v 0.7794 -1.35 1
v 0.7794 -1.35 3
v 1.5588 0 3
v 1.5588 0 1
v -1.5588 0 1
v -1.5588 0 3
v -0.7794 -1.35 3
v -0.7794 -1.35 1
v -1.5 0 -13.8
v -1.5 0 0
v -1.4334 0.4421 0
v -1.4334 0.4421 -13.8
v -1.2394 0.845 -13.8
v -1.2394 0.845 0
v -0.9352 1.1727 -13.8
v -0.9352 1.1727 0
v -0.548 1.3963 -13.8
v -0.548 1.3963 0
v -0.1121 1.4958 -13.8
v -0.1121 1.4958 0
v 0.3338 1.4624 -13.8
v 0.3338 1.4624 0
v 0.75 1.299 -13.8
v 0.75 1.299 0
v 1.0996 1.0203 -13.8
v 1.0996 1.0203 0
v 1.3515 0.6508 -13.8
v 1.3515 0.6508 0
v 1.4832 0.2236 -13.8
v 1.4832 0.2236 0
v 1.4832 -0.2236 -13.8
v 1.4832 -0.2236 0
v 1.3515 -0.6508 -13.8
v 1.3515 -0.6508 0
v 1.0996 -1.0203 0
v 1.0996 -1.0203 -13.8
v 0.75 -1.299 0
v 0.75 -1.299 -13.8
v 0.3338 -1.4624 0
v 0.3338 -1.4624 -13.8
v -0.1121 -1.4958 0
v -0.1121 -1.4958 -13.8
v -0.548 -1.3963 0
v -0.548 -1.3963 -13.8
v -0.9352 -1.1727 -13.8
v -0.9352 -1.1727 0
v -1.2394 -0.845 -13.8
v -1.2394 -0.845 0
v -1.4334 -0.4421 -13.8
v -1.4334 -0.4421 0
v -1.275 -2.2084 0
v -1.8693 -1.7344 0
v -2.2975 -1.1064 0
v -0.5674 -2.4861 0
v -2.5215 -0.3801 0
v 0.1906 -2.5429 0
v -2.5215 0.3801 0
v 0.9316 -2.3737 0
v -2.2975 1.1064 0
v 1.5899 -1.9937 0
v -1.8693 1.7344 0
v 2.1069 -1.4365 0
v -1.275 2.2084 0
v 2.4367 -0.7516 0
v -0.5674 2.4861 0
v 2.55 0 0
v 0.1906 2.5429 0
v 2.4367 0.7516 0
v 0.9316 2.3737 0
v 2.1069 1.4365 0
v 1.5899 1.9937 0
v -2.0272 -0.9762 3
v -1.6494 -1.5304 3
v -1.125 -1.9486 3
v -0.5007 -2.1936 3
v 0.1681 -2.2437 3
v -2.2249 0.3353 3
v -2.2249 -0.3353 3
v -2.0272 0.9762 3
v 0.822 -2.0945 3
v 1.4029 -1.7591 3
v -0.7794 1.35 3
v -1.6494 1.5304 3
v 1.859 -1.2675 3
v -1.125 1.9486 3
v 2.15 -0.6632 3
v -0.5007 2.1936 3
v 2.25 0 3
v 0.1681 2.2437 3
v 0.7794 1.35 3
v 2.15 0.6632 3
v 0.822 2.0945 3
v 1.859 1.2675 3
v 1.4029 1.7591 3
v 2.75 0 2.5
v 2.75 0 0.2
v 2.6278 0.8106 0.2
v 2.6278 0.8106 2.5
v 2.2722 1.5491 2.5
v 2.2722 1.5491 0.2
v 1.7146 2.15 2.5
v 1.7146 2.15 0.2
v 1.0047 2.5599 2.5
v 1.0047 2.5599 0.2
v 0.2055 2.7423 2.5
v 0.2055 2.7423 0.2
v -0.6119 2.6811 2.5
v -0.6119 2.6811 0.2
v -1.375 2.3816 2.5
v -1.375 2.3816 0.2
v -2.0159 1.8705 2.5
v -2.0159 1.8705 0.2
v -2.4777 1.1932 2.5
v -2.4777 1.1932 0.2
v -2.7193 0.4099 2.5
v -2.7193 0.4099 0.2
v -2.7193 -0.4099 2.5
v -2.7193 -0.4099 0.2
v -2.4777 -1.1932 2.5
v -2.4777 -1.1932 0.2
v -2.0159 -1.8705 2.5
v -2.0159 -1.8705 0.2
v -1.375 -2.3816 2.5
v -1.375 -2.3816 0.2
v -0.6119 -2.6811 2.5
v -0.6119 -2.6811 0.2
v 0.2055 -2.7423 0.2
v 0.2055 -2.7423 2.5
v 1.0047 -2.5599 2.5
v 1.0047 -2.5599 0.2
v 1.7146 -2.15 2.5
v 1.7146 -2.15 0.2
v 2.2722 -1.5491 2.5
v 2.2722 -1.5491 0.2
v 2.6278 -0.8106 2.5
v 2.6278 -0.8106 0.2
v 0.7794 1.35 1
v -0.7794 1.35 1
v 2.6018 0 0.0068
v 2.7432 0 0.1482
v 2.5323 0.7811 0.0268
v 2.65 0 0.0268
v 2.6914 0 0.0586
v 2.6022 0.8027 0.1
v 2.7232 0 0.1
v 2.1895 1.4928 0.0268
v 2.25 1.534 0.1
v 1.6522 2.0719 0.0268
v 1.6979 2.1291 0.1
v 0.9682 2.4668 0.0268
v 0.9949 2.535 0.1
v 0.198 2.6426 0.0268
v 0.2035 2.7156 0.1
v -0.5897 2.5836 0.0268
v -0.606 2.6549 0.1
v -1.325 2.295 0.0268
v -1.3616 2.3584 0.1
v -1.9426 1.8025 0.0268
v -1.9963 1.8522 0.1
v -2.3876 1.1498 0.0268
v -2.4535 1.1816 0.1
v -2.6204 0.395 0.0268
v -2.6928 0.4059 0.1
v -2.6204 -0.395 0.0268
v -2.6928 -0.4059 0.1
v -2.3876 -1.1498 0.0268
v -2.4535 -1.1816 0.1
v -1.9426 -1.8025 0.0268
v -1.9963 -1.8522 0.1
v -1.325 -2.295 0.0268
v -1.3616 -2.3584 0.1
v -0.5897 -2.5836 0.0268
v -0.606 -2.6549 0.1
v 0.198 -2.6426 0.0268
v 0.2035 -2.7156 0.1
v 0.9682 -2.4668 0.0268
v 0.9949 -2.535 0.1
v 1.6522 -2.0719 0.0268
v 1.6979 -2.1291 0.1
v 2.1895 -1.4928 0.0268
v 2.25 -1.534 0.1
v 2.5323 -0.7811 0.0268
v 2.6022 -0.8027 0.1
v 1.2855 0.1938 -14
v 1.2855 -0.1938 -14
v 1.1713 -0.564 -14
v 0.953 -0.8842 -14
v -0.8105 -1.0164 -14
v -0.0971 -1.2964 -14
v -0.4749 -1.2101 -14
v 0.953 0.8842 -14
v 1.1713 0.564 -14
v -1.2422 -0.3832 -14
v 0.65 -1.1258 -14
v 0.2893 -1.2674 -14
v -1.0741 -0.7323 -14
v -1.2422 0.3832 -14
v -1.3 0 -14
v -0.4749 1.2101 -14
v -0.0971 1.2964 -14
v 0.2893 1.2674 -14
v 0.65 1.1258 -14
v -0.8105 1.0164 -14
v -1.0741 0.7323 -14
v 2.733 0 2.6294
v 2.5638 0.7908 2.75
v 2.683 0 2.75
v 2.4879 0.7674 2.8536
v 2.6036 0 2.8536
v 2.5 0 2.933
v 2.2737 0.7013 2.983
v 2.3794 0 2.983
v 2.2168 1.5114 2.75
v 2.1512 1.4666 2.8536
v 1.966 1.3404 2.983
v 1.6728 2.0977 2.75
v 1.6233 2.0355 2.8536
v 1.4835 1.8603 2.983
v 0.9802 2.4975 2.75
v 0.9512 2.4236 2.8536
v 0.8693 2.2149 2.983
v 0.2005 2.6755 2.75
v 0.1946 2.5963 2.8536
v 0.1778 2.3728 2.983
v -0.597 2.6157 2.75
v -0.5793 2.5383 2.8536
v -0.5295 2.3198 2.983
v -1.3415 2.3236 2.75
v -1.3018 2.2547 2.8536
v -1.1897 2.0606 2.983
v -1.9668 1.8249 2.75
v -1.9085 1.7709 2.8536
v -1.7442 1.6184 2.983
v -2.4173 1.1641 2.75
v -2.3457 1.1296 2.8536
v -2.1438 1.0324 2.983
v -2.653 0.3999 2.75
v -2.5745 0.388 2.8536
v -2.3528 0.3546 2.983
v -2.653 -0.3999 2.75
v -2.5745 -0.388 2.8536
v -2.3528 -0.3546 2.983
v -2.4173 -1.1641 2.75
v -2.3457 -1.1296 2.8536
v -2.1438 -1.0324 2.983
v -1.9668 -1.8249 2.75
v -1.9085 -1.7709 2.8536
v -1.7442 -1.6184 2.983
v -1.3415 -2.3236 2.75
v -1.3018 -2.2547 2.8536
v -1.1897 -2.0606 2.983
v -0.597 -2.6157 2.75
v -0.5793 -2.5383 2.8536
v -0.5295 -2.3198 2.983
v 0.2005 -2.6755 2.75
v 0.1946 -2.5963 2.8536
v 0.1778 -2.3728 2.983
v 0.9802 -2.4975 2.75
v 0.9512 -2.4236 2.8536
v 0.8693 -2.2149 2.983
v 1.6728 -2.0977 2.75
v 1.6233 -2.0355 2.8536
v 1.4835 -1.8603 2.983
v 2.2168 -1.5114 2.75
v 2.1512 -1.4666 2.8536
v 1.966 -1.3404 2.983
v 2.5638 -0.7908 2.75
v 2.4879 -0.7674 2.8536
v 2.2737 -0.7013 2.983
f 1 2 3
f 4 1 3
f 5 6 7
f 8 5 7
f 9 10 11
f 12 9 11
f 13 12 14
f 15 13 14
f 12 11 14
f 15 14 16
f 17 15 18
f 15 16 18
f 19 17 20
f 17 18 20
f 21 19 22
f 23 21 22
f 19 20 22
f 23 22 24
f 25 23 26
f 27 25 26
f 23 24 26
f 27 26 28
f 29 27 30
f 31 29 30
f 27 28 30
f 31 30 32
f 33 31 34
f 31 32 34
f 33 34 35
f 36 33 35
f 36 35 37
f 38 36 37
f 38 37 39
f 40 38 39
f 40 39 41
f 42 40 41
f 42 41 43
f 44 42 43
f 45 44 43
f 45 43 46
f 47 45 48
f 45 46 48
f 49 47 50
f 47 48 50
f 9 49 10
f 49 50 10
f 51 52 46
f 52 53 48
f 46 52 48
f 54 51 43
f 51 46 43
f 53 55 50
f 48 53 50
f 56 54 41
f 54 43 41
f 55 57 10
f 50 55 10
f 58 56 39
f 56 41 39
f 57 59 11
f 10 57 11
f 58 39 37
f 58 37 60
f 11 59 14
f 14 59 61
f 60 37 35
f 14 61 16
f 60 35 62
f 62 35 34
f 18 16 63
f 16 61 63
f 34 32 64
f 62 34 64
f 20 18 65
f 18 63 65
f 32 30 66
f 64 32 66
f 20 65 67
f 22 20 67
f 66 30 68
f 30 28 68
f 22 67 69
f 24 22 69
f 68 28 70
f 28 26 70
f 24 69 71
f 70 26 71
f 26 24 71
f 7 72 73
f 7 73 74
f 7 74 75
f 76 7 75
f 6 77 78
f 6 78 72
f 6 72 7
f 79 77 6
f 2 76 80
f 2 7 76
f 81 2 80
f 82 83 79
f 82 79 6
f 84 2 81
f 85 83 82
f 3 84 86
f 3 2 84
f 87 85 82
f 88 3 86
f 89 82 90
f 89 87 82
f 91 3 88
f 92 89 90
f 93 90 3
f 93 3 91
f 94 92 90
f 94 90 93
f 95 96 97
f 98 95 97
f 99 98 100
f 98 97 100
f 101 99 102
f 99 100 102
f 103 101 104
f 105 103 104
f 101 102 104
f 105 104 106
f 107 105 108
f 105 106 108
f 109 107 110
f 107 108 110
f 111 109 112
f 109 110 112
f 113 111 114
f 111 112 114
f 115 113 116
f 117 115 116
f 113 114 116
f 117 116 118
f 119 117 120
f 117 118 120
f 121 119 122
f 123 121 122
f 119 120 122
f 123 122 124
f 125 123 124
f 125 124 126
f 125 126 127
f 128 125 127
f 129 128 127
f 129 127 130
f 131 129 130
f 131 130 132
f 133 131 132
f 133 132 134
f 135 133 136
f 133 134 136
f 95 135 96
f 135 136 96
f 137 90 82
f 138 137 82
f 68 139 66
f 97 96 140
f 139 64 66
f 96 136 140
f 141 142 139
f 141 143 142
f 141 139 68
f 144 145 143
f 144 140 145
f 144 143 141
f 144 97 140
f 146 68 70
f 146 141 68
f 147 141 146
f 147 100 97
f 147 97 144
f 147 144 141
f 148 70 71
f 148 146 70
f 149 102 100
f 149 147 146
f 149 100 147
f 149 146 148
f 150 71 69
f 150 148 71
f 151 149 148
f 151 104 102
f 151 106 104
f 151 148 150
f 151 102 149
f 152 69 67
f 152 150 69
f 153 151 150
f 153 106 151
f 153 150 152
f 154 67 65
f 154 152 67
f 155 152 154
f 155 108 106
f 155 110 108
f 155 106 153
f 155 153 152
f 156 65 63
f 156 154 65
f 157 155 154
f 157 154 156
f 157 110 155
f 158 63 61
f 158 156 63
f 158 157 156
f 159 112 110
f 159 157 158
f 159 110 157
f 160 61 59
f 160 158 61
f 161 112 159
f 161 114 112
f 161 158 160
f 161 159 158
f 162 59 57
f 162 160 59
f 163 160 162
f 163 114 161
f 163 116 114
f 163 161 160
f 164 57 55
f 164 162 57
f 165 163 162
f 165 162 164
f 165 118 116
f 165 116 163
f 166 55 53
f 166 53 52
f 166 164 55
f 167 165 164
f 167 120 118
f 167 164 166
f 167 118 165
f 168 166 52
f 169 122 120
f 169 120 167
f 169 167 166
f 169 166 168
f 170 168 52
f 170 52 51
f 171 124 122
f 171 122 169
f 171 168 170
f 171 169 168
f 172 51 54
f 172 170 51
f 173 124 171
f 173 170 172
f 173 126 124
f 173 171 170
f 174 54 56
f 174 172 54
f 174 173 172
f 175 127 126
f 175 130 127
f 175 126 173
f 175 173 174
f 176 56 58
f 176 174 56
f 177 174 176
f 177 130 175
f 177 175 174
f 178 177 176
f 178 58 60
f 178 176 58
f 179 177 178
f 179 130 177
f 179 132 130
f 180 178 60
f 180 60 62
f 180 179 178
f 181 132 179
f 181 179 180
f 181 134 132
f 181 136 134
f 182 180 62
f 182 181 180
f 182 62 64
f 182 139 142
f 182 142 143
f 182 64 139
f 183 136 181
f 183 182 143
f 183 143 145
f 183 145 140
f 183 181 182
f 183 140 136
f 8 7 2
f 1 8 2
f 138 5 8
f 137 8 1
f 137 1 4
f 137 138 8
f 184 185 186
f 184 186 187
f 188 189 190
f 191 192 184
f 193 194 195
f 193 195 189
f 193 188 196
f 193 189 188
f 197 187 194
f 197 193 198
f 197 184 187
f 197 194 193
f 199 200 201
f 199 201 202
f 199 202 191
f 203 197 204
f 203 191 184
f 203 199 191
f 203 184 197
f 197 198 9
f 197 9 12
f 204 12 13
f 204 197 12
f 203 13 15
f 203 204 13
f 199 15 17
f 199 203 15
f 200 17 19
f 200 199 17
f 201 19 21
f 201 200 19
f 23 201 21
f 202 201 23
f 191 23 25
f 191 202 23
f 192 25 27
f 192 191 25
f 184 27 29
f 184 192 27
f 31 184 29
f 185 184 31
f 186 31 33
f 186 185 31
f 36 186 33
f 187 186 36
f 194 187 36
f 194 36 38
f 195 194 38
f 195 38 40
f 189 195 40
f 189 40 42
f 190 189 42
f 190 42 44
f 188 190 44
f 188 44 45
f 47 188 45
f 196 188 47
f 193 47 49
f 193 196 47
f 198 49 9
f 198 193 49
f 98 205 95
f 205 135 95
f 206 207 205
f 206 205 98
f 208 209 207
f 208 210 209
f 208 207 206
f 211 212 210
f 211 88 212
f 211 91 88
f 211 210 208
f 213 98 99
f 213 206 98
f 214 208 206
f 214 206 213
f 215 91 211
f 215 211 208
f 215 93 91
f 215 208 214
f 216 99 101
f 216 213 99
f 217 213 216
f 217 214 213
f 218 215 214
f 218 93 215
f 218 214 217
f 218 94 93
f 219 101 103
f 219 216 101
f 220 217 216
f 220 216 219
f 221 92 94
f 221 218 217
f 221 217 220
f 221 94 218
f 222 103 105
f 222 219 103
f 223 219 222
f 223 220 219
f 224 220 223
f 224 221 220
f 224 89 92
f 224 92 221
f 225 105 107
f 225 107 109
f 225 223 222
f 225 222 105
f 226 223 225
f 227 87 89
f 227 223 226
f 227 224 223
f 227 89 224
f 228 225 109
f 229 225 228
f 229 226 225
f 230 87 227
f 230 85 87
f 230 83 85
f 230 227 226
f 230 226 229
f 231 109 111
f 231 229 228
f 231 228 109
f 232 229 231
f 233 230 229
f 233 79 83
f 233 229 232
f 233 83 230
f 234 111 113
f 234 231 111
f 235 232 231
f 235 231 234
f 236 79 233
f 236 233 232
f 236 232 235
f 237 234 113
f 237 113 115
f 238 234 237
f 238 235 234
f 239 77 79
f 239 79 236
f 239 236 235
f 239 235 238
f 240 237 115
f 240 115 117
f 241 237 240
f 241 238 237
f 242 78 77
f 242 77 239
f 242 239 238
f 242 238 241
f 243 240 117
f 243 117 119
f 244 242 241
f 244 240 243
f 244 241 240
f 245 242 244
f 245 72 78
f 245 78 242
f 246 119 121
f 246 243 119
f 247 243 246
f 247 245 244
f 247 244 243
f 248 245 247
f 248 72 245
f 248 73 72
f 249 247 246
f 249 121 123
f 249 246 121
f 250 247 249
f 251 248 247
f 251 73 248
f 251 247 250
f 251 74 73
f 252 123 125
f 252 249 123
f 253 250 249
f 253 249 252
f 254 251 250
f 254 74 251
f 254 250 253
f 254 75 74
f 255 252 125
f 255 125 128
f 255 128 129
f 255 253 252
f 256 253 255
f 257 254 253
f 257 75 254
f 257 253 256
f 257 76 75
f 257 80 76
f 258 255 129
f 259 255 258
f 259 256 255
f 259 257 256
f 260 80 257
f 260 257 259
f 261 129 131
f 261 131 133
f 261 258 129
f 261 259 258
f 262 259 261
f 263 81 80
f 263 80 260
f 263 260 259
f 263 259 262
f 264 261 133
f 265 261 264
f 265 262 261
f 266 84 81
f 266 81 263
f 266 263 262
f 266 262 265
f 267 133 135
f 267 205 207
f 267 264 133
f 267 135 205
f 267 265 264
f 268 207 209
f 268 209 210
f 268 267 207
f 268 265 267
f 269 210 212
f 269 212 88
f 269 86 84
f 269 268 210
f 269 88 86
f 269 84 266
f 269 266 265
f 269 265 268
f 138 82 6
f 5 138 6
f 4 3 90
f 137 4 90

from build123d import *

# Parameters (mm, degrees)
SKETCH_1_R          = 2.75
EXTRUDE_1_DEPTH     = 3
FILLET_1_R          = 0.5
CUT_EXTRUDE_1_DEPTH = 2
SKETCH_3_R          = 1.5
EXTRUDE_2_DEPTH     = 14
CHAMFER_1_SIZE      = 0.2
FILLET_2_R          = 0.2


with BuildPart() as part:
    # 草图1 → 凸台-拉伸1 (new body)
    with BuildSketch(Plane.XY):
        Circle(SKETCH_1_R)
    extrude(amount=EXTRUDE_1_DEPTH)

    # 圆角1
    fillet_1_edges = [part.edges().sort_by_distance(p)[0] for p in [
        (-2.75, 0, 3),
    ]]
    fillet(fillet_1_edges, radius=FILLET_1_R)

    # 草图2 → 切除-拉伸1 (cut)
    with BuildSketch(Plane.XY.offset(3)):
        Polygon((1.558845727, 0), (0.779422863, 1.35), (-0.779422863, 1.35), (-1.558845727, 0), (-0.779422863, -1.35), (0.779422863, -1.35), align=None)
    extrude(amount=-CUT_EXTRUDE_1_DEPTH, mode=Mode.SUBTRACT)

    # 草图3 → 凸台-拉伸2 (add)
    with BuildSketch(Plane(origin=(0, 0, 0), x_dir=(-1, 0, 0), z_dir=(0, 0, -1))):
        Circle(SKETCH_3_R)
    extrude(amount=EXTRUDE_2_DEPTH)

    # 倒角1
    chamfer_1_edges = [part.edges().sort_by_distance(p)[0] for p in [
        (1.5, 0, -14),
    ]]
    chamfer(chamfer_1_edges, length=CHAMFER_1_SIZE)

    # 圆角2
    fillet_2_edges = [part.edges().sort_by_distance(p)[0] for p in [
        (-2.75, 0, 0),
    ]]
    fillet(fillet_2_edges, radius=FILLET_2_R)


solid = part.part
